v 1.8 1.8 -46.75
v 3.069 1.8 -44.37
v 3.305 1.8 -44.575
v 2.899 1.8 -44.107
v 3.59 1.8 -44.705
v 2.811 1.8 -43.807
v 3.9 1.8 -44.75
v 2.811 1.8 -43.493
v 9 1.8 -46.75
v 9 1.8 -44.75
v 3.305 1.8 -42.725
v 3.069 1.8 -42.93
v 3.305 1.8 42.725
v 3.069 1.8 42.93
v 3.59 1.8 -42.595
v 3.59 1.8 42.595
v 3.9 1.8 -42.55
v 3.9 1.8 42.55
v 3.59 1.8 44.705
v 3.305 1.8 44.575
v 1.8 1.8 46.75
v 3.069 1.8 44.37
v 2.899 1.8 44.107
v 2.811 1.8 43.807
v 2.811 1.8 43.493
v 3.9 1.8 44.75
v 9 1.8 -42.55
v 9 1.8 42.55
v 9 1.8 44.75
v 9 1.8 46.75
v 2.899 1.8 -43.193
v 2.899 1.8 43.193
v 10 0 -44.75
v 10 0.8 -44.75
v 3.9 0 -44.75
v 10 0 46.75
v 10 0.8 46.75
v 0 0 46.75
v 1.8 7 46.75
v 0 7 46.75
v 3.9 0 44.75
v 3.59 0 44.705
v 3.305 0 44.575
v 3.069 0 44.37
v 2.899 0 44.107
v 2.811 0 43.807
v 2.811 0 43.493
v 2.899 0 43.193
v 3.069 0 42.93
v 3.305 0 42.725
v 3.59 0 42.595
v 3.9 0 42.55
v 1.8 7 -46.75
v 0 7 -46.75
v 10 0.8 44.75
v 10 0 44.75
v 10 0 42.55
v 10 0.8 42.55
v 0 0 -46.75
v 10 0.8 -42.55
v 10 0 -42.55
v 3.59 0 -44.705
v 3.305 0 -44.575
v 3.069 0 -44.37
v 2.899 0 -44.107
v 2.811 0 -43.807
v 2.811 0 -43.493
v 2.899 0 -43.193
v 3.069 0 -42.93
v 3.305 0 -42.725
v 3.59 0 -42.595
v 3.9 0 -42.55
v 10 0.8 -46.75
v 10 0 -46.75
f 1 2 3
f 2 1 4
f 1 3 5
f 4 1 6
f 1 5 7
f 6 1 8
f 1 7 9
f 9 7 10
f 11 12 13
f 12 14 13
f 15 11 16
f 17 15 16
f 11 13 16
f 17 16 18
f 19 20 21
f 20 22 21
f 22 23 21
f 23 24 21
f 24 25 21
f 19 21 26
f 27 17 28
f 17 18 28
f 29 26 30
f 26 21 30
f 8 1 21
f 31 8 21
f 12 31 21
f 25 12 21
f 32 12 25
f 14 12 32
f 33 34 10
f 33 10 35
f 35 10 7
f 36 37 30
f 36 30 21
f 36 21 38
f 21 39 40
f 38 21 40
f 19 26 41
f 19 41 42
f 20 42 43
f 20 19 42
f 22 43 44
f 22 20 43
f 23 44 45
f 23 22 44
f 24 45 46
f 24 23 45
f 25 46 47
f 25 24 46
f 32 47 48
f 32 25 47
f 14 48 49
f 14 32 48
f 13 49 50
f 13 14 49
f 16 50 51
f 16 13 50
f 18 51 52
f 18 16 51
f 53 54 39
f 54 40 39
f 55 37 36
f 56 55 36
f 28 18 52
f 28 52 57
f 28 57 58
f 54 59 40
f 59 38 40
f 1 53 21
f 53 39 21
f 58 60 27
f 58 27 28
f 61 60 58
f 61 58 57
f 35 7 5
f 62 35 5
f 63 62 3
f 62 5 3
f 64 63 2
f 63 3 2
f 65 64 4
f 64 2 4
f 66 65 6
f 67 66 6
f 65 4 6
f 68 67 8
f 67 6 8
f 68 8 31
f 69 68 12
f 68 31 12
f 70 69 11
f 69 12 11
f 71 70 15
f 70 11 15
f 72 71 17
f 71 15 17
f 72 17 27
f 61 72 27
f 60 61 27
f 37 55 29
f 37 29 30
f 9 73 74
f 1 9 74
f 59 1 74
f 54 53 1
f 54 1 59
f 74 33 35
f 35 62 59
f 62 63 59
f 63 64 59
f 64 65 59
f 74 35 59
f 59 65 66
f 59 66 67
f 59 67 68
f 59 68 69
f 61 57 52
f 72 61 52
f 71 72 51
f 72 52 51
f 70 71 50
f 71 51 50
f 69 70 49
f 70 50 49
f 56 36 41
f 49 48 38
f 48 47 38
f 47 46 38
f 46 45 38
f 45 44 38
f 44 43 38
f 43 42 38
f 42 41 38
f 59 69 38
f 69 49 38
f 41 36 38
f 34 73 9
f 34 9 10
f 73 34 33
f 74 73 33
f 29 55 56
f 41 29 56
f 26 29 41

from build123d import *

# Parameters (mm, degrees)
EXTRUDE_THIN1_DEPTH = 46.75
CHAMFER1_SIZE       = 1
CUT_EXTRUDE1_DEPTH  = 10


with BuildPart() as part:
    # Sketch1 → Extrude-Thin1 (new, symmetric)
    with BuildSketch(Plane.XY):
        Polygon((10, 0), (0, 0), (0, 7), (1.8, 7), (1.8, 1.8), (10, 1.8), align=None)
    extrude(amount=EXTRUDE_THIN1_DEPTH, both=True)

    # Chamfer1
    chamfer1_edges = [part.edges().sort_by_distance(p)[0] for p in [
        (10, 1.8, 0),
    ]]
    chamfer(chamfer1_edges, length=CHAMFER1_SIZE)

    # Sketch2 → Cut-Extrude1 (cut)
    with BuildSketch(Plane(origin=(0, 1.8, 0), x_dir=(1, 0, 0), z_dir=(0, 1, 0))):
        with BuildLine():
            Line((11.522549571, -44.75), (3.9, -44.75))
            ThreePointArc((3.9, -44.75), (2.8, -43.65), (3.9, -42.55))
            Line((3.9, -42.55), (11.522549571, -42.55))
            ThreePointArc((11.522549571, -42.55), (12.622549571, -43.65), (11.522549571, -44.75))
        make_face()
    cut_extrude1 = extrude(amount=-CUT_EXTRUDE1_DEPTH, mode=Mode.SUBTRACT)

    # Mirror1: Cut-Extrude1 across plane
    add(cut_extrude1.mirror(Plane.XY), mode=Mode.SUBTRACT)


solid = part.part
